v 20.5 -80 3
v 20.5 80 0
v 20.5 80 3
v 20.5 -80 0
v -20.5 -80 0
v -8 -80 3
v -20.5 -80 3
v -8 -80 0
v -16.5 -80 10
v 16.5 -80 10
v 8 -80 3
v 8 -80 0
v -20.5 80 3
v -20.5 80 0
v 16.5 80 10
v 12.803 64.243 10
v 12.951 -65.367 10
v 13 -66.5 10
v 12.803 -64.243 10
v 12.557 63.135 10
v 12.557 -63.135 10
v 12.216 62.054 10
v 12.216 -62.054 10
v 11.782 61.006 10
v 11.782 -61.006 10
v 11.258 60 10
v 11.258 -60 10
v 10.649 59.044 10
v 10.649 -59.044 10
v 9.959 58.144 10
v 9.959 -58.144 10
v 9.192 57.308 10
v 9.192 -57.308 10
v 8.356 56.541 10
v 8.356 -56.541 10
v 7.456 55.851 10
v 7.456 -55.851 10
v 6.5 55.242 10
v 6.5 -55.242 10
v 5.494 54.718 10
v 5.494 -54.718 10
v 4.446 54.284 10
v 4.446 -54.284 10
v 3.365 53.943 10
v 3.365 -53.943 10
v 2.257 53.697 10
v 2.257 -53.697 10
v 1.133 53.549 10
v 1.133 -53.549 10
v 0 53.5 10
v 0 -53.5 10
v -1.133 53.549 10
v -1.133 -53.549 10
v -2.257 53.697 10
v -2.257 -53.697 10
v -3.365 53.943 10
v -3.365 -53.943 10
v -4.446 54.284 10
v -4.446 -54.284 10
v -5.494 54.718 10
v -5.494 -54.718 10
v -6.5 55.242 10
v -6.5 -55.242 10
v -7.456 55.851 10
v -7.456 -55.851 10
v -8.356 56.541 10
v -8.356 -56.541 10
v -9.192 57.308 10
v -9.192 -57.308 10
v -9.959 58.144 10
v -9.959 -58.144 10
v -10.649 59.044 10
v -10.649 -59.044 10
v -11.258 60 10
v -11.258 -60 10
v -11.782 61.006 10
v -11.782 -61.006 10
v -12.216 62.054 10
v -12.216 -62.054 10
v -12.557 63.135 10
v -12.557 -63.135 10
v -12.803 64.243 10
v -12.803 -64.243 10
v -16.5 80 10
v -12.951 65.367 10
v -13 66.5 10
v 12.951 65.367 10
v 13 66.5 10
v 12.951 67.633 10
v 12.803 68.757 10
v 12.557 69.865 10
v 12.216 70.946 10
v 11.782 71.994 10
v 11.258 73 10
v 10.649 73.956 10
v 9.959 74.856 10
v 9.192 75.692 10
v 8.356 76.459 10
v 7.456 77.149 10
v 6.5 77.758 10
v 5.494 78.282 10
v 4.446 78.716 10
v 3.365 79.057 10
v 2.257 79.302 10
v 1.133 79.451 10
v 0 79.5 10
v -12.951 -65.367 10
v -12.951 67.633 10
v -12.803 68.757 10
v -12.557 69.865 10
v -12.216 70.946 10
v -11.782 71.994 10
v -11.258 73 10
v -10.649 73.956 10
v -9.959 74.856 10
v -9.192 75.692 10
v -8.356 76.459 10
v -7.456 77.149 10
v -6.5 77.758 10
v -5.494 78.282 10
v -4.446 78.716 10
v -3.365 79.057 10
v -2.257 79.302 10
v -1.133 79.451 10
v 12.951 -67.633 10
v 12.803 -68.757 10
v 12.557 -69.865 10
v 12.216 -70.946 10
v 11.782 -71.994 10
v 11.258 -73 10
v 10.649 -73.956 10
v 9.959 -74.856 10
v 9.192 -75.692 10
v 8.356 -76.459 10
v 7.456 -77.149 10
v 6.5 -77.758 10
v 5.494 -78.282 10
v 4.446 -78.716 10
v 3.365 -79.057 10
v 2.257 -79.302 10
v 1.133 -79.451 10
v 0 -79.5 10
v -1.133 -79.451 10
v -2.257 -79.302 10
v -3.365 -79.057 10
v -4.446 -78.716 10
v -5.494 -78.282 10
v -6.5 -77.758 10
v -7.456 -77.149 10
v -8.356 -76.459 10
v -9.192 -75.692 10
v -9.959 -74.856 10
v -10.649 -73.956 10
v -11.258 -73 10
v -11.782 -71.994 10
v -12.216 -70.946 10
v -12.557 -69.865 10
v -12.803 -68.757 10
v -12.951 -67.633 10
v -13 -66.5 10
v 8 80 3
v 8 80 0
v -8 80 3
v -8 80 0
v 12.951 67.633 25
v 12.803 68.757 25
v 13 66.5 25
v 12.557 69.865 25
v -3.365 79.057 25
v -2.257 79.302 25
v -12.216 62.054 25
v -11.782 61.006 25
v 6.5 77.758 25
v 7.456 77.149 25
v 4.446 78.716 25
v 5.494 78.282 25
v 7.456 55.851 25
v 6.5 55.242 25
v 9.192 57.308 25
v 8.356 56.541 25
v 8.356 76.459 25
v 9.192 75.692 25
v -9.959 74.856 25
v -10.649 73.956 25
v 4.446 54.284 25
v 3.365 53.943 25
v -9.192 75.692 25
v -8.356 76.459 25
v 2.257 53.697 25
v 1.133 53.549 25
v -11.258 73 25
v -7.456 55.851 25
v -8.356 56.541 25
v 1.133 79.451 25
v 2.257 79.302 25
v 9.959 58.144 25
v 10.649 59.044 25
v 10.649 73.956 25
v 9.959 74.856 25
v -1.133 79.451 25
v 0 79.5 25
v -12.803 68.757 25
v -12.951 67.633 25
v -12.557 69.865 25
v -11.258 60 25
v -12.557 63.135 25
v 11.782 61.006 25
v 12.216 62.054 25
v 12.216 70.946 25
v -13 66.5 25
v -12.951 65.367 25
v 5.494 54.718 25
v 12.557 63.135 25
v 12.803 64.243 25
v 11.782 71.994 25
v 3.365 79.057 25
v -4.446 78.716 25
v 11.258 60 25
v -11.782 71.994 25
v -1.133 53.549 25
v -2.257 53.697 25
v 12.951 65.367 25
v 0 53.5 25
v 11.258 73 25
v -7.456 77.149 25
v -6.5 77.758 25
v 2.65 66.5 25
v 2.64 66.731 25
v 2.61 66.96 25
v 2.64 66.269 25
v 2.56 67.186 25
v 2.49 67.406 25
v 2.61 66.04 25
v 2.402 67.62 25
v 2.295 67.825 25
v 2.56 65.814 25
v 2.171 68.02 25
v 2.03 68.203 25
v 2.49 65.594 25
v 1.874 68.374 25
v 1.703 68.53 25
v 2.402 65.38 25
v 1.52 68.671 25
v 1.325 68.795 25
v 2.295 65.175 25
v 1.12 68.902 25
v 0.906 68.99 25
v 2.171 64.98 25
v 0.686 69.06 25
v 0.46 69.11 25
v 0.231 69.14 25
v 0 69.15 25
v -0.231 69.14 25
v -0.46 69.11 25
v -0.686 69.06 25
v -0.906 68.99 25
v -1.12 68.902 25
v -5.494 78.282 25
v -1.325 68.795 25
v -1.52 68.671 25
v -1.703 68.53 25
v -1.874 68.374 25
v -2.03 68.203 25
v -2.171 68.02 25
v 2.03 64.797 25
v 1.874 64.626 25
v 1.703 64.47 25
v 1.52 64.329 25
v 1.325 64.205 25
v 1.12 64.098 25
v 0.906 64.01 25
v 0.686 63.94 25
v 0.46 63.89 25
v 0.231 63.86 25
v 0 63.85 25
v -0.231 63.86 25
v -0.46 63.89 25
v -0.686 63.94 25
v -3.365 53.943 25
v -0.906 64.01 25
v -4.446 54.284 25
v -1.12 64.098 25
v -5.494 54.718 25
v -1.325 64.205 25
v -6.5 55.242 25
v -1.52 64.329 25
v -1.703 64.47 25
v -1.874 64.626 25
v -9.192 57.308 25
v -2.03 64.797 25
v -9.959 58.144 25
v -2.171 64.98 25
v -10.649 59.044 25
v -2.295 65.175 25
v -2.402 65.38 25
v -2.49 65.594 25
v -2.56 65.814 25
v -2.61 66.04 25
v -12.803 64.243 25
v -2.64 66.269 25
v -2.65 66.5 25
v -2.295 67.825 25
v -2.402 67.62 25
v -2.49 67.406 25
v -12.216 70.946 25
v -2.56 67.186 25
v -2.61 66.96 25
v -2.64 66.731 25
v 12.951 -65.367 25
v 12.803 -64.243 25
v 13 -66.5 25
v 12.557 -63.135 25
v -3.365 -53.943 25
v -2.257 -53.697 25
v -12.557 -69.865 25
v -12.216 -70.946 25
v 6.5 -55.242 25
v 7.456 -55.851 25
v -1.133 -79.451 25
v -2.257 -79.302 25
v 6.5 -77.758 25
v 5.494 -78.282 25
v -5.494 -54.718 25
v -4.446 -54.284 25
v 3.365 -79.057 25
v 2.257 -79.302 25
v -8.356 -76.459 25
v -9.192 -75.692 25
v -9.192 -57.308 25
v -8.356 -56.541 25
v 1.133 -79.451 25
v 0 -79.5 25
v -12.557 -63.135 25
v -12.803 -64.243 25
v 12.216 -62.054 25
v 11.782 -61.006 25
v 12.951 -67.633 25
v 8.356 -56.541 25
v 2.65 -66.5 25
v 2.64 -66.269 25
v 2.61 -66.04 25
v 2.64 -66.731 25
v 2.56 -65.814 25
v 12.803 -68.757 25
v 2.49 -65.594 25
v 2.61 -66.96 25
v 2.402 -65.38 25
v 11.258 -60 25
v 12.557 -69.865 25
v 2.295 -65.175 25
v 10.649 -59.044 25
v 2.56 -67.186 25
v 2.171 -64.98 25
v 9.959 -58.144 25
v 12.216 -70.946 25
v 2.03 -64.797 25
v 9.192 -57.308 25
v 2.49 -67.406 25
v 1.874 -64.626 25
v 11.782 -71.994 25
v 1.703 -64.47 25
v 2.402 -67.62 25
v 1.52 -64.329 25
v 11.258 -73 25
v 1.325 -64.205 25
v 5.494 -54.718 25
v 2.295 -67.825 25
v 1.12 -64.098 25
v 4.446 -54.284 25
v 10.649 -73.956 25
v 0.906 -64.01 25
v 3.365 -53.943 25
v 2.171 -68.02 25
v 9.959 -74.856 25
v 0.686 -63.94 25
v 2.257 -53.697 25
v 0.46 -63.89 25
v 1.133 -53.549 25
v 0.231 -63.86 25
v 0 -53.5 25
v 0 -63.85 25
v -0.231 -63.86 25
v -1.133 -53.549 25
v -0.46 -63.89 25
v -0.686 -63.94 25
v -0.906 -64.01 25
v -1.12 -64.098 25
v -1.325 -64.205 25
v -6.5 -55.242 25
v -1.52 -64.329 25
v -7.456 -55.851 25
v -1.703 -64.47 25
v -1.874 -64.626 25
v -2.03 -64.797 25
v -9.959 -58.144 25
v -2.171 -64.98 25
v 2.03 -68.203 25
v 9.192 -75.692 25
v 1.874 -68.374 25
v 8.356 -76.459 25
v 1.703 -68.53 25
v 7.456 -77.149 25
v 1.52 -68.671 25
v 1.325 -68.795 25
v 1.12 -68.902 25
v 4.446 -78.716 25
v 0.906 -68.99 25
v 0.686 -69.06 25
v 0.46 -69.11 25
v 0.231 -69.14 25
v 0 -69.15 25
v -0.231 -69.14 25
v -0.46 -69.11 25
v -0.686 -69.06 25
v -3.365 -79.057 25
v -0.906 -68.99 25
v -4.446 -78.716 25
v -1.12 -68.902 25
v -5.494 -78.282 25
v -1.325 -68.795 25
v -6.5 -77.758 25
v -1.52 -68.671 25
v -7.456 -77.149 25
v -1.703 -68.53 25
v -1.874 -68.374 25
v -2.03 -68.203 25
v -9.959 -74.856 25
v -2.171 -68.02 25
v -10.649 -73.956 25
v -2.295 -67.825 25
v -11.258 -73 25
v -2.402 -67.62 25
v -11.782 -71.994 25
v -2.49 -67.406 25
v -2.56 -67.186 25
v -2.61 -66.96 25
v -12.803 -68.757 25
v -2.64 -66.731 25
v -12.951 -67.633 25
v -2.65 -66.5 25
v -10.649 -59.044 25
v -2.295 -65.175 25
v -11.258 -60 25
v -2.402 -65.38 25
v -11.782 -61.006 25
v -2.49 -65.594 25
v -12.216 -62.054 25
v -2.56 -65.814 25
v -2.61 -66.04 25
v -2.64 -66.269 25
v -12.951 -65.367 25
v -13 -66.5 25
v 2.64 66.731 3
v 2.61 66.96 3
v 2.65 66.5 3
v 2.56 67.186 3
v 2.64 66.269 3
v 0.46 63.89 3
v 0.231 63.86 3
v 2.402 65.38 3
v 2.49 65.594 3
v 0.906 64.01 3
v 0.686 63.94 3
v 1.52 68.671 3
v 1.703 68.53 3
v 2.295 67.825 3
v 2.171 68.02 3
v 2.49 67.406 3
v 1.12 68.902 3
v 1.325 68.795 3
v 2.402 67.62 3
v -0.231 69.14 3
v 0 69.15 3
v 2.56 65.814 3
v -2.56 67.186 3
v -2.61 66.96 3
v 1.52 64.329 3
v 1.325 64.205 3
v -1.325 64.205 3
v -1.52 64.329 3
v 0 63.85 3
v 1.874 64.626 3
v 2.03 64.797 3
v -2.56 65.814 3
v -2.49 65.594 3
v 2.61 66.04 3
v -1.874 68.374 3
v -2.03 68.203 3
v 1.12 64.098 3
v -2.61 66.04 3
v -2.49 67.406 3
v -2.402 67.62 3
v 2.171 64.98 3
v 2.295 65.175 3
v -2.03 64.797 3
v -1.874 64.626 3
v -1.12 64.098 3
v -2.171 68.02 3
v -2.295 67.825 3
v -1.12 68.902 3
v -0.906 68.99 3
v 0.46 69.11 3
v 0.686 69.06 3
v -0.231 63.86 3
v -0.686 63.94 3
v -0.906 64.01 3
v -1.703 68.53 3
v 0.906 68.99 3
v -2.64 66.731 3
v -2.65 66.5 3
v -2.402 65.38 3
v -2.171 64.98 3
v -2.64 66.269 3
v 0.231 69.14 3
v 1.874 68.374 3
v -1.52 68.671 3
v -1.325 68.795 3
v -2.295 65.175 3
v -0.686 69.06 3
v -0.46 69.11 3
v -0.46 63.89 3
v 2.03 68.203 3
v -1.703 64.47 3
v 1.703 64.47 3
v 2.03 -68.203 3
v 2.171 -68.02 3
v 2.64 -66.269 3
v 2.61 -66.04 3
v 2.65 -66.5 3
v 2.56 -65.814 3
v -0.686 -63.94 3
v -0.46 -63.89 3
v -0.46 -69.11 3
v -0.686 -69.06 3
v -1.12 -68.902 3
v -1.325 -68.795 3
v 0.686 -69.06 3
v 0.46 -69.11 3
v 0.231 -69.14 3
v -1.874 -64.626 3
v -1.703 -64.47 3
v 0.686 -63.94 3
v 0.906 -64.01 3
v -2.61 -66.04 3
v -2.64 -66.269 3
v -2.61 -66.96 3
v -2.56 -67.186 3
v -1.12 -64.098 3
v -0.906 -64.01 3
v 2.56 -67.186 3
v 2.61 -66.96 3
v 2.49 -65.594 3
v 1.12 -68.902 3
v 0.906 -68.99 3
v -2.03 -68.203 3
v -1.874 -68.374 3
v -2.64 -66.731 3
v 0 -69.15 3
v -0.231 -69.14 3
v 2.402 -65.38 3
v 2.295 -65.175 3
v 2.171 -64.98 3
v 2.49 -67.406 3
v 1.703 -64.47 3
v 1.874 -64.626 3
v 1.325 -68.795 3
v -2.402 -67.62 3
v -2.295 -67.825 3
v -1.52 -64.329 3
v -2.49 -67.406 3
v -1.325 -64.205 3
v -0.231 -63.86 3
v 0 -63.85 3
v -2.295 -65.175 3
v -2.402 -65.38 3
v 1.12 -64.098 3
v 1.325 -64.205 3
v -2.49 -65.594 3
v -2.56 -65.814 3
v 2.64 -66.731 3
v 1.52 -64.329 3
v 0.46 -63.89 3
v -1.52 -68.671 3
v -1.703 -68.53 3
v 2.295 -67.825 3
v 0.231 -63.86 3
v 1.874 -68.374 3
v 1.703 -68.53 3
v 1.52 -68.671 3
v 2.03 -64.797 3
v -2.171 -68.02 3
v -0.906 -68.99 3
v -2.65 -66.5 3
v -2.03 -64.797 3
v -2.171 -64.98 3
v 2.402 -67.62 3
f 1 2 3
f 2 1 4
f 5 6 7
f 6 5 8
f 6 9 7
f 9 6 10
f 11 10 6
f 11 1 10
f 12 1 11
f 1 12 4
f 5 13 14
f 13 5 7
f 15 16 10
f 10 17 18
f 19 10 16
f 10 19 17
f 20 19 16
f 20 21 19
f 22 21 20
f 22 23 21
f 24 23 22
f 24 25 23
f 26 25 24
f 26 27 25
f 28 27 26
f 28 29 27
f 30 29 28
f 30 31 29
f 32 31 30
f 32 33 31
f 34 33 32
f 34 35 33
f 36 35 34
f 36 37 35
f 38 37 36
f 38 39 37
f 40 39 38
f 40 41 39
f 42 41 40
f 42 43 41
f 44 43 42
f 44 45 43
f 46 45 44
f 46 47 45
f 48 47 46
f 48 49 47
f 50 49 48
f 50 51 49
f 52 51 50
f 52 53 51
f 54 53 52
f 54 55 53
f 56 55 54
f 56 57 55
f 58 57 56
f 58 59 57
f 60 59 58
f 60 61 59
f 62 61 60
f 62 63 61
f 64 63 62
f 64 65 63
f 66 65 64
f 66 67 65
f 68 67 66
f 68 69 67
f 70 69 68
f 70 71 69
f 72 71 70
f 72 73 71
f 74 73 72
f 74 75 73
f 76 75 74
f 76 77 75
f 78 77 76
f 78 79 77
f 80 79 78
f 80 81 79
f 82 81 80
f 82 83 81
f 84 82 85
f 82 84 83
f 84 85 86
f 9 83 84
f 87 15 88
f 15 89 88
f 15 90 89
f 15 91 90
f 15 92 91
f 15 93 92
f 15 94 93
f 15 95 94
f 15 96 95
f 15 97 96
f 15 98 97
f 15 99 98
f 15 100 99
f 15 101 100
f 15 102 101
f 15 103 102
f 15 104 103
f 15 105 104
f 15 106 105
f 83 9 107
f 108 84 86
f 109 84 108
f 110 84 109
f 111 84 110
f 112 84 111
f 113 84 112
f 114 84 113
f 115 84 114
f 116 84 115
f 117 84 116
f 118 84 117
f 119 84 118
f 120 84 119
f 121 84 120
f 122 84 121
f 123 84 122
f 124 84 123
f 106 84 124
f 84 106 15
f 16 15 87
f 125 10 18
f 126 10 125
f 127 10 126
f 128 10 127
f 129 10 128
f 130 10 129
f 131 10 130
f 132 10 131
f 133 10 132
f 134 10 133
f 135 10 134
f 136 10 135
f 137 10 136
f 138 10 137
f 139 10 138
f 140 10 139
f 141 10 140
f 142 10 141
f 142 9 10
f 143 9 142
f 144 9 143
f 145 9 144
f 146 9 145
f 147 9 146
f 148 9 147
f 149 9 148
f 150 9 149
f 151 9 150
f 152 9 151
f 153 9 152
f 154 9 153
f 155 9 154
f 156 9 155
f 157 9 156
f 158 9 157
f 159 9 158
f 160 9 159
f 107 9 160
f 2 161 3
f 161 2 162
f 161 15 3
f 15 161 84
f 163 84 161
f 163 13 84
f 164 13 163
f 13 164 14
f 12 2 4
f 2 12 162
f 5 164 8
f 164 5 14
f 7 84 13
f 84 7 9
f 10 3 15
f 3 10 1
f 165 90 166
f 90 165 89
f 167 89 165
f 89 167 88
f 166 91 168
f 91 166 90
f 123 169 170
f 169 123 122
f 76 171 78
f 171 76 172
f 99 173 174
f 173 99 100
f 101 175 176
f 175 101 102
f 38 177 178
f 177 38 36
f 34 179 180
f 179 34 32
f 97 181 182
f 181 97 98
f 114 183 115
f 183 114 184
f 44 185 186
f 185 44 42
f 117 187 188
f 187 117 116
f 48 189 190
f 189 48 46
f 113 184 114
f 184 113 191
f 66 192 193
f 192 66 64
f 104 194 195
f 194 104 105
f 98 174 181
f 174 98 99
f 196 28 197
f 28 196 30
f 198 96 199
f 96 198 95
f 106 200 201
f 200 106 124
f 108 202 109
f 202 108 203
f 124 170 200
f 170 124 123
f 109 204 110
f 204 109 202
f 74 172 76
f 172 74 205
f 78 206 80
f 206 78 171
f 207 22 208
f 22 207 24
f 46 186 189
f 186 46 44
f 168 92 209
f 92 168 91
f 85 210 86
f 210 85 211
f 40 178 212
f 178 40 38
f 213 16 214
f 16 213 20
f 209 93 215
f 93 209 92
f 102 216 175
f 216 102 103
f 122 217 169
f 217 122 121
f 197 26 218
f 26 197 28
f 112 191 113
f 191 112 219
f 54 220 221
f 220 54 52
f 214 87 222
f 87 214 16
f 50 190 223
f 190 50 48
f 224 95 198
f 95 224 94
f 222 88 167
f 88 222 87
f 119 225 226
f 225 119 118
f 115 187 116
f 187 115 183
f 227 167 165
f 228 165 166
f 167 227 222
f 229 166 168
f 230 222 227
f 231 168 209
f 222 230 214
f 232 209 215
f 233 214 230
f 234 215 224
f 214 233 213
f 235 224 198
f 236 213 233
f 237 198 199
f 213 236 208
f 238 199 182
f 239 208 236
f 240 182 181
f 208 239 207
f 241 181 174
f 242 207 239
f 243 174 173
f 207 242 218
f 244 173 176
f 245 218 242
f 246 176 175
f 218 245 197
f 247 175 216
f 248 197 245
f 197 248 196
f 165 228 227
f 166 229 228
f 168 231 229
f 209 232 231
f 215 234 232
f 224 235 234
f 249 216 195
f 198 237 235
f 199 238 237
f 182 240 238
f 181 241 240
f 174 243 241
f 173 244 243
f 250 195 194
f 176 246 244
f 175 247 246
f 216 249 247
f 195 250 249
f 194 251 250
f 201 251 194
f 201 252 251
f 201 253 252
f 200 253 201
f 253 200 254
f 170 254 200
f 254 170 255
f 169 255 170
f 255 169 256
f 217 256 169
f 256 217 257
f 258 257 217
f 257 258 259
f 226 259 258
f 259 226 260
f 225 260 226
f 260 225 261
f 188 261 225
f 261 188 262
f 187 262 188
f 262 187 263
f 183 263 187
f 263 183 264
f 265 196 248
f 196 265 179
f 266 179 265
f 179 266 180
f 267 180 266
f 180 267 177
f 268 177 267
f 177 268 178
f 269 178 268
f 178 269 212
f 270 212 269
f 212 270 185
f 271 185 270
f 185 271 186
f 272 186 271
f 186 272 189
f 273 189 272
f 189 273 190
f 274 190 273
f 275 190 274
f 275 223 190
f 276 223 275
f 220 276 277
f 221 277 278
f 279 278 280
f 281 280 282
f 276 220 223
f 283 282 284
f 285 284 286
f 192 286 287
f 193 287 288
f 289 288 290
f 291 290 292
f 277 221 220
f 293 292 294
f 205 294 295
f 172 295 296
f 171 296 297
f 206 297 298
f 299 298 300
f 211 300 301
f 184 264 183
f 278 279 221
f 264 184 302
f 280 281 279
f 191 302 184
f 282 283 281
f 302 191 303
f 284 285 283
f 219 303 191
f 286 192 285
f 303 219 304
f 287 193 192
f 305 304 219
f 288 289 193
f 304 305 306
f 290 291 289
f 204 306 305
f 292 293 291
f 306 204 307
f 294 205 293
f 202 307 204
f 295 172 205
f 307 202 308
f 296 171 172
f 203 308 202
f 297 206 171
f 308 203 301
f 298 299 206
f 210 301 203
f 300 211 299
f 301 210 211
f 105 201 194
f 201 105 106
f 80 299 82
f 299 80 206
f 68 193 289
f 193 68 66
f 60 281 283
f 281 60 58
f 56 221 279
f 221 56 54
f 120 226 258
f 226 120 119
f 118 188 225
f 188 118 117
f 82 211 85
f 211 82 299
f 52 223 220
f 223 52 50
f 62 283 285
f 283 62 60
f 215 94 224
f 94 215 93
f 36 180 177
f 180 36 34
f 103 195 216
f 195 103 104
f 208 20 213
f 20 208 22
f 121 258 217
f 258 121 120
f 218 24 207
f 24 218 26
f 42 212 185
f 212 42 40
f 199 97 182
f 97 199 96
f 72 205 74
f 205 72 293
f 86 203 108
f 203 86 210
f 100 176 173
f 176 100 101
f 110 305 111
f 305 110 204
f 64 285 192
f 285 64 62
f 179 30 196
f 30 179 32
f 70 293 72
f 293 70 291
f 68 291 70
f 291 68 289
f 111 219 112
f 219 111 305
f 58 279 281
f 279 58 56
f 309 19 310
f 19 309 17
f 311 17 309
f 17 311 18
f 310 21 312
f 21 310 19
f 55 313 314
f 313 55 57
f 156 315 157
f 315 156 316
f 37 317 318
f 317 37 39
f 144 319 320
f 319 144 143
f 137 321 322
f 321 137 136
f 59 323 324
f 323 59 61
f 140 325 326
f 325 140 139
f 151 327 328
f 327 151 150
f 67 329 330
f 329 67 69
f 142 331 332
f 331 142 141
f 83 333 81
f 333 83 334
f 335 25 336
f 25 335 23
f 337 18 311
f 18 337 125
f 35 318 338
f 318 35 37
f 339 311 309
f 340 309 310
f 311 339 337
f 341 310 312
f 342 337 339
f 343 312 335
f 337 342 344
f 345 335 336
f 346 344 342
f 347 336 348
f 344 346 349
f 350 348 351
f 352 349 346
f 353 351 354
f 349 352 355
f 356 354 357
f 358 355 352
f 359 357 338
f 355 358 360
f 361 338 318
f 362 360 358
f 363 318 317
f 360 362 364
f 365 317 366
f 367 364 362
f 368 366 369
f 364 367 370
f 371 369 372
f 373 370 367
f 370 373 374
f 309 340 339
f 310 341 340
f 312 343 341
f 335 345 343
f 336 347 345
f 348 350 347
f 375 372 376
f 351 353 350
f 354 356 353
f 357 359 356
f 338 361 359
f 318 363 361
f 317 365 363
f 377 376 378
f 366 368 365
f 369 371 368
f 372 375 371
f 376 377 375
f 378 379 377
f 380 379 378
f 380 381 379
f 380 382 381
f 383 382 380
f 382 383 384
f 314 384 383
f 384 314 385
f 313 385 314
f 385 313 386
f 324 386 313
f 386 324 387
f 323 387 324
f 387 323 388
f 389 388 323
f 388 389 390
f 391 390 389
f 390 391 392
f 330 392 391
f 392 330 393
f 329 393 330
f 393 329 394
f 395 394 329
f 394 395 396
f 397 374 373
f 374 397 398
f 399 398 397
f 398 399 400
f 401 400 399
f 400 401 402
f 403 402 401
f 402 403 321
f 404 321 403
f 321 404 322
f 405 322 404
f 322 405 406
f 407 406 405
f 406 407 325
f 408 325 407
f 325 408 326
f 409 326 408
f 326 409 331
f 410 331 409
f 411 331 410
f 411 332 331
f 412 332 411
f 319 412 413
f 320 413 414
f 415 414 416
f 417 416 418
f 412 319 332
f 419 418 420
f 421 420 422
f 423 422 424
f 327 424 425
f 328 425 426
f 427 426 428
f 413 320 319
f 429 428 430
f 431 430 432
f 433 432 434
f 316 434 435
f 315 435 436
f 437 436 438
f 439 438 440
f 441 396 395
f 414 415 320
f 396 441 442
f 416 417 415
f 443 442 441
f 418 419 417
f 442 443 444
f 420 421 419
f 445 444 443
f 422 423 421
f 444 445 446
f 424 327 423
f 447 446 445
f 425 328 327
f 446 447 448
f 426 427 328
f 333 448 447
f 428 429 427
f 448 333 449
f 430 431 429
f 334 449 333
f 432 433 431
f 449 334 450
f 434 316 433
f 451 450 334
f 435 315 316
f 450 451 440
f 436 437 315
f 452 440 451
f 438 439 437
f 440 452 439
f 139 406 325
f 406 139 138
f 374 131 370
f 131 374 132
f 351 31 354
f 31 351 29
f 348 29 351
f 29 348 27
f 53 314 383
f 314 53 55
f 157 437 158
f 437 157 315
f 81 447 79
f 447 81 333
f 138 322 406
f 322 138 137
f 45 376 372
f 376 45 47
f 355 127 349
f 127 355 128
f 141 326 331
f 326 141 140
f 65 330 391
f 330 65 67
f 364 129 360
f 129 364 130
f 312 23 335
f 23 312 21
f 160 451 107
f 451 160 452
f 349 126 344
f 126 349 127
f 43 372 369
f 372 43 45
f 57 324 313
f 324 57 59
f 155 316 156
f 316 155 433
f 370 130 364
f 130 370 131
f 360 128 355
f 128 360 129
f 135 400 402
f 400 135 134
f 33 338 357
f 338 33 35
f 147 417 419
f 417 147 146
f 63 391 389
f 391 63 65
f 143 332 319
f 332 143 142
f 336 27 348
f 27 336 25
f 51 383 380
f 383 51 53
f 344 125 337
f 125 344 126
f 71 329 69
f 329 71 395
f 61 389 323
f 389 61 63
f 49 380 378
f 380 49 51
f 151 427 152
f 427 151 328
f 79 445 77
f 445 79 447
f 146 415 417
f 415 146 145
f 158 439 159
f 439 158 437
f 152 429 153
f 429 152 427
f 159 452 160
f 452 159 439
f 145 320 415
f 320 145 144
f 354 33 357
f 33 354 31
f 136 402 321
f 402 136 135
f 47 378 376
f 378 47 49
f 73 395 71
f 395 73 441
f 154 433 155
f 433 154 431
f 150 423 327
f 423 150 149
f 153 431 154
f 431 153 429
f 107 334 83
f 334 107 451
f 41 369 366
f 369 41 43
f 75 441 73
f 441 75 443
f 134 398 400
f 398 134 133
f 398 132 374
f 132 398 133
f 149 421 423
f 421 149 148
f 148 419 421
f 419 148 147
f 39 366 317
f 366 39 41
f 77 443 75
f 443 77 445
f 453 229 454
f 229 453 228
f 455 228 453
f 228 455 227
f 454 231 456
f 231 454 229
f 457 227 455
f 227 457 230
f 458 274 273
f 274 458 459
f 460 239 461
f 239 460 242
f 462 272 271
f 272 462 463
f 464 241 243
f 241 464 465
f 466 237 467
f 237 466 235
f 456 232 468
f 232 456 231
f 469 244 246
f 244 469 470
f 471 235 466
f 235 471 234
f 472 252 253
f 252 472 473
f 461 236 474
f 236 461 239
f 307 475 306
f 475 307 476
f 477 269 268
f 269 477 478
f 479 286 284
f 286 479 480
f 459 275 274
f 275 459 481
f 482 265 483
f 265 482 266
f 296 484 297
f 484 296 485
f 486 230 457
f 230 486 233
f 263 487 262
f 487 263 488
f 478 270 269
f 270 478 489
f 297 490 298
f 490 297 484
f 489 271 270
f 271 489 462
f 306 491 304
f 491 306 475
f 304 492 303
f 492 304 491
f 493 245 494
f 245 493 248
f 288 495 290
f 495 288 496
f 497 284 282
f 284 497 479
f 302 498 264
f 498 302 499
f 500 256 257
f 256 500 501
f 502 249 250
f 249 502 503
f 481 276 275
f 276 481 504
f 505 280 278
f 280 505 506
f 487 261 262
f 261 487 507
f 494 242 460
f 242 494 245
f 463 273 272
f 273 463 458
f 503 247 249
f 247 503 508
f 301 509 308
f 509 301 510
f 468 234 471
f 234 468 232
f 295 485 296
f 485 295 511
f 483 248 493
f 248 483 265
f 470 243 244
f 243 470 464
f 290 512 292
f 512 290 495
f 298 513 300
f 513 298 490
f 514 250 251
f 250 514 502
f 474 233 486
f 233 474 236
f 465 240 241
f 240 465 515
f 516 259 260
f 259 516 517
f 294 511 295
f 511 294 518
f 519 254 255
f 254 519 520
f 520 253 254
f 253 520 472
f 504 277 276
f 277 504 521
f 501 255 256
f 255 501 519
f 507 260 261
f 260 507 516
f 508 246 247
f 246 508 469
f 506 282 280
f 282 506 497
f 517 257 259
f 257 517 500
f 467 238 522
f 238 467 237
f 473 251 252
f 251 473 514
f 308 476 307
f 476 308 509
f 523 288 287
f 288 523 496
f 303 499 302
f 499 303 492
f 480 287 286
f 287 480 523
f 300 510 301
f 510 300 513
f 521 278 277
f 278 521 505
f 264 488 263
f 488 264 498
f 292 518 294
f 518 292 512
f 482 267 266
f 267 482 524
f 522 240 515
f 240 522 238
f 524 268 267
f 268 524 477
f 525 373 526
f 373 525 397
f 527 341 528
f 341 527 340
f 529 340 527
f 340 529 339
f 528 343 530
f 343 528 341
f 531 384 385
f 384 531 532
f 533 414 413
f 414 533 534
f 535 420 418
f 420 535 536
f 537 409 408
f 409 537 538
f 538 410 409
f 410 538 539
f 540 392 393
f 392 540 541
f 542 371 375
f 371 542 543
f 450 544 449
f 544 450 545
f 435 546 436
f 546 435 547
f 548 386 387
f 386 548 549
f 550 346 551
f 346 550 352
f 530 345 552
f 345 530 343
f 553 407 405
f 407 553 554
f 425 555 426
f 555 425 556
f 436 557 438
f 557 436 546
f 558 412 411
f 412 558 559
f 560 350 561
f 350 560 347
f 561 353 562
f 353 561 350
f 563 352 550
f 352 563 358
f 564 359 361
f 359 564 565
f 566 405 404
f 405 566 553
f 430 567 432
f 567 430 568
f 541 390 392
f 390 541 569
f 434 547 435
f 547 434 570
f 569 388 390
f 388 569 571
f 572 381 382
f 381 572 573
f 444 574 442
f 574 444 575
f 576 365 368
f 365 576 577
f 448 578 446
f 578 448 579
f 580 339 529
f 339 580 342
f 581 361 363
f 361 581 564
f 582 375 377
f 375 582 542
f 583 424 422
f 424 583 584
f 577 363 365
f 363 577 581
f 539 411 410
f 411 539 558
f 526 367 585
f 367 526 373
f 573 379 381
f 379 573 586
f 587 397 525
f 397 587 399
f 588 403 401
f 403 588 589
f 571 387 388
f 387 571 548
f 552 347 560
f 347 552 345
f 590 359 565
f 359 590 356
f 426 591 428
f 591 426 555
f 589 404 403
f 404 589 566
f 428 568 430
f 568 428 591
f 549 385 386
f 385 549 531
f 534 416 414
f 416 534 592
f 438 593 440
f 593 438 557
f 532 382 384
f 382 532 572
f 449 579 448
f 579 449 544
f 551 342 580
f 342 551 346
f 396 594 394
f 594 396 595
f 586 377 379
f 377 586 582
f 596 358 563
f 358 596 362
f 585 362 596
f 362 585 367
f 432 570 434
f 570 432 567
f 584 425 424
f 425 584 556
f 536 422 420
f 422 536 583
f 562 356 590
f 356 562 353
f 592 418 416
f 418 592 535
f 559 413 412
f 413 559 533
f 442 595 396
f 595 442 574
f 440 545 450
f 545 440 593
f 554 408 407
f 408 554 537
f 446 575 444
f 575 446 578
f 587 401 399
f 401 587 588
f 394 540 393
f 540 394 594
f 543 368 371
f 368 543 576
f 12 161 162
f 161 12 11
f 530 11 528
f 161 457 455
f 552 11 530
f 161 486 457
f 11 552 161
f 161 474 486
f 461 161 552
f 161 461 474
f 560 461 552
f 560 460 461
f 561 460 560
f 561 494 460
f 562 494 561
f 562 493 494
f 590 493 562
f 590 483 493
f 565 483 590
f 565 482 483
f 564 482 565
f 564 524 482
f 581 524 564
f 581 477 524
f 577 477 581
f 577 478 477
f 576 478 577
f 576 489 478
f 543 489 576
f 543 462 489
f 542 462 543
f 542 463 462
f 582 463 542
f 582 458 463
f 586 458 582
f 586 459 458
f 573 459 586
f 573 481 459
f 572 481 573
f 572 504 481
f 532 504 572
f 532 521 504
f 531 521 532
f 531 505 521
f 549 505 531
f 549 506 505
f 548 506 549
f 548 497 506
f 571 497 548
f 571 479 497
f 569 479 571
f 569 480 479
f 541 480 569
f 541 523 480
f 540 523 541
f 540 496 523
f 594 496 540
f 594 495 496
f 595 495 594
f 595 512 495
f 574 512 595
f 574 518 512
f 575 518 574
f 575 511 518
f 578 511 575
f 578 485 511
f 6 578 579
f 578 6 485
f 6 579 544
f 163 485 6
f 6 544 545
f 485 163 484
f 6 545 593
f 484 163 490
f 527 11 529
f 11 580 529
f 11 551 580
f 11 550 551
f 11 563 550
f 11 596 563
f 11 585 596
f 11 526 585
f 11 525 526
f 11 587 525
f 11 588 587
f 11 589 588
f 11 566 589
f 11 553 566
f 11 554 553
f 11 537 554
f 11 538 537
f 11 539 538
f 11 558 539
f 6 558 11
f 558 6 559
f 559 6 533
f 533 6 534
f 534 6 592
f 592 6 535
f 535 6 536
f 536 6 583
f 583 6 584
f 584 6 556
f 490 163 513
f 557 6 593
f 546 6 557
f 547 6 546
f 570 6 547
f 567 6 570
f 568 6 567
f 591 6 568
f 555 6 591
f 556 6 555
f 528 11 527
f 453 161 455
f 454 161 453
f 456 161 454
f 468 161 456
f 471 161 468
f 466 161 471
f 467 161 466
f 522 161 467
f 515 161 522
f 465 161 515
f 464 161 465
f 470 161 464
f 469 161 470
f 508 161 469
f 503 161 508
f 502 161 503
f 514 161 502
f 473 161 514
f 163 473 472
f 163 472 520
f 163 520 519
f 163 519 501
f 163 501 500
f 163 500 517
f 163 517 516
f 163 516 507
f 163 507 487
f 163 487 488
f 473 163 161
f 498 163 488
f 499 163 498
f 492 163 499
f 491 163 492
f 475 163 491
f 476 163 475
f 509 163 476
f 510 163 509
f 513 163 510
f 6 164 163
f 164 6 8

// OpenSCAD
// QUEUE D'ARONDE ARKA-SWISS POUR TREPIED ULANZI VIDEO OMBRA
// Pierre REVEL 15/06/24
//
// Projet lunette PVC 60 mm DIY
// Spécifiquement conçue pour les colliers pour tubes diamètre 63 et leurs vis de fixation murale 30 mm

$fn=72;

longueur=160;   // Longueur queue d'aronde
ecart=133;      // Ecart entre les colliers
trouvis=5.3;    // Diamètre des trous

module matiere() {
  union() {
    translate([-20.5,0,0]) rotate([90,0,0]) linear_extrude(height=longueur,center=true) polygon(points=[[0,0],[0,3],[4,10],[37,10],[41,3],[41,0]]);
    translate([0,ecart/2,3]) cylinder(h=22,r=13);
    translate([0,-ecart/2,3]) cylinder(h=22,r=13);
  }
}

module percage() {
  translate([0,ecart/2,-10]) cylinder(h=45,d=trouvis);
  translate([0,-ecart/2,-10])  cylinder(h=45,d=trouvis);
  translate([0,0,1]) cube([16,180,4],center=true);
}

difference() {
  matiere();
  percage();
}
